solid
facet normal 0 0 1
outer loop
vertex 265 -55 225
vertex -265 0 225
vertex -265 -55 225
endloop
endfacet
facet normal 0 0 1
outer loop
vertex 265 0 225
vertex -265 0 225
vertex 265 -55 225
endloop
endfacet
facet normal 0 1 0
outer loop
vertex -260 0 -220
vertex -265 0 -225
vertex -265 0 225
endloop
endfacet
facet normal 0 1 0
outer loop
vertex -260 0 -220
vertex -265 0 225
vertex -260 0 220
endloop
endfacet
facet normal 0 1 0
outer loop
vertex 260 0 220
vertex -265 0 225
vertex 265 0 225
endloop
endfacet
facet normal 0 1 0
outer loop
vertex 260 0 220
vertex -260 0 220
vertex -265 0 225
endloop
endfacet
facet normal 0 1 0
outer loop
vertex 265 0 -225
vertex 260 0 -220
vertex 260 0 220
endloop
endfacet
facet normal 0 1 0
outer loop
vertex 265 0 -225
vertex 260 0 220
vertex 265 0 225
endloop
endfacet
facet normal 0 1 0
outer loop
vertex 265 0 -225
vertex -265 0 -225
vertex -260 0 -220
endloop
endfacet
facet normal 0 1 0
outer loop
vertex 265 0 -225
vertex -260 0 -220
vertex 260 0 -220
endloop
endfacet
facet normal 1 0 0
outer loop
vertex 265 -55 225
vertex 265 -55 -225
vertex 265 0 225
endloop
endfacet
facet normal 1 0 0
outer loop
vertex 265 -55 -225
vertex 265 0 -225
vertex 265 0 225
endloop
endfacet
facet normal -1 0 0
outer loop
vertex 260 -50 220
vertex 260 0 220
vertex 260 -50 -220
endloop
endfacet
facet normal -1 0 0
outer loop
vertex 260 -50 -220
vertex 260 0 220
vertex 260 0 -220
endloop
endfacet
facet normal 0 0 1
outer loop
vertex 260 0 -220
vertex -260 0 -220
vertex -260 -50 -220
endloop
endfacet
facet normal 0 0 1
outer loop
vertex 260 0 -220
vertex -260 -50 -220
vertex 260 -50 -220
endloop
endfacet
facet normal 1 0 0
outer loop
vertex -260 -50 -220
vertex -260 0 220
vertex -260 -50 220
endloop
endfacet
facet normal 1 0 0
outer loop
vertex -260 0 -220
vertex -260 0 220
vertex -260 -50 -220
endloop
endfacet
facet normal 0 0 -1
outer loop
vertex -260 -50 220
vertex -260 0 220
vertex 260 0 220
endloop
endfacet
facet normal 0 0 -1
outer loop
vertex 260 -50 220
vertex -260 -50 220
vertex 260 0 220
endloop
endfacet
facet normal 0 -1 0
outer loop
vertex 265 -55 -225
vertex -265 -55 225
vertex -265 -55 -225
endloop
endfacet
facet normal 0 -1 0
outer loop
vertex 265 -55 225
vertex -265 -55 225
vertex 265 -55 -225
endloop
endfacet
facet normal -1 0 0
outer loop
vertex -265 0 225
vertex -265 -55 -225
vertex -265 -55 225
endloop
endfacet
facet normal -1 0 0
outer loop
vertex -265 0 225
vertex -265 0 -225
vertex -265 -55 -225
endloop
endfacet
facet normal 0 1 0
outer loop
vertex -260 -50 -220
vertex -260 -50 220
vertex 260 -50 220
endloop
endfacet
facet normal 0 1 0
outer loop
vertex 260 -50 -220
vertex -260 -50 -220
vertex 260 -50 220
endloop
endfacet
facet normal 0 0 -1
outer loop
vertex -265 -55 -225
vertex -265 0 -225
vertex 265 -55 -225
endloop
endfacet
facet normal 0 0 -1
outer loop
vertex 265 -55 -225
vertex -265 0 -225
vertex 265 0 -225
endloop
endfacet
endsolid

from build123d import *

# Parameters (mm, degrees)
CROQUIS1_W            = 530
CROQUIS1_H            = 450
CROQUIS1_W_2          = 520
CROQUIS1_H_2          = 440
EXTRUIR_L_MINA1_DEPTH = 50
CROQUIS2_W            = 530
CROQUIS2_H            = 450
EXTRUIR1_DEPTH        = 5


with BuildPart() as part:
    # Croquis1 → Extruir-Lámina1 (new body)
    with BuildSketch(Plane(origin=(0, 0, 0), x_dir=(1, 0, 0), z_dir=(0, 1, 0))):
        Rectangle(CROQUIS1_W, CROQUIS1_H)
        Rectangle(CROQUIS1_W_2, CROQUIS1_H_2, mode=Mode.SUBTRACT)
    extrude(amount=-EXTRUIR_L_MINA1_DEPTH)

    # Croquis2 → Extruir1 (add)
    with BuildSketch(Plane.XZ.offset(50)):
        Rectangle(CROQUIS2_W, CROQUIS2_H)
    extrude(amount=EXTRUIR1_DEPTH)


solid = part.part
